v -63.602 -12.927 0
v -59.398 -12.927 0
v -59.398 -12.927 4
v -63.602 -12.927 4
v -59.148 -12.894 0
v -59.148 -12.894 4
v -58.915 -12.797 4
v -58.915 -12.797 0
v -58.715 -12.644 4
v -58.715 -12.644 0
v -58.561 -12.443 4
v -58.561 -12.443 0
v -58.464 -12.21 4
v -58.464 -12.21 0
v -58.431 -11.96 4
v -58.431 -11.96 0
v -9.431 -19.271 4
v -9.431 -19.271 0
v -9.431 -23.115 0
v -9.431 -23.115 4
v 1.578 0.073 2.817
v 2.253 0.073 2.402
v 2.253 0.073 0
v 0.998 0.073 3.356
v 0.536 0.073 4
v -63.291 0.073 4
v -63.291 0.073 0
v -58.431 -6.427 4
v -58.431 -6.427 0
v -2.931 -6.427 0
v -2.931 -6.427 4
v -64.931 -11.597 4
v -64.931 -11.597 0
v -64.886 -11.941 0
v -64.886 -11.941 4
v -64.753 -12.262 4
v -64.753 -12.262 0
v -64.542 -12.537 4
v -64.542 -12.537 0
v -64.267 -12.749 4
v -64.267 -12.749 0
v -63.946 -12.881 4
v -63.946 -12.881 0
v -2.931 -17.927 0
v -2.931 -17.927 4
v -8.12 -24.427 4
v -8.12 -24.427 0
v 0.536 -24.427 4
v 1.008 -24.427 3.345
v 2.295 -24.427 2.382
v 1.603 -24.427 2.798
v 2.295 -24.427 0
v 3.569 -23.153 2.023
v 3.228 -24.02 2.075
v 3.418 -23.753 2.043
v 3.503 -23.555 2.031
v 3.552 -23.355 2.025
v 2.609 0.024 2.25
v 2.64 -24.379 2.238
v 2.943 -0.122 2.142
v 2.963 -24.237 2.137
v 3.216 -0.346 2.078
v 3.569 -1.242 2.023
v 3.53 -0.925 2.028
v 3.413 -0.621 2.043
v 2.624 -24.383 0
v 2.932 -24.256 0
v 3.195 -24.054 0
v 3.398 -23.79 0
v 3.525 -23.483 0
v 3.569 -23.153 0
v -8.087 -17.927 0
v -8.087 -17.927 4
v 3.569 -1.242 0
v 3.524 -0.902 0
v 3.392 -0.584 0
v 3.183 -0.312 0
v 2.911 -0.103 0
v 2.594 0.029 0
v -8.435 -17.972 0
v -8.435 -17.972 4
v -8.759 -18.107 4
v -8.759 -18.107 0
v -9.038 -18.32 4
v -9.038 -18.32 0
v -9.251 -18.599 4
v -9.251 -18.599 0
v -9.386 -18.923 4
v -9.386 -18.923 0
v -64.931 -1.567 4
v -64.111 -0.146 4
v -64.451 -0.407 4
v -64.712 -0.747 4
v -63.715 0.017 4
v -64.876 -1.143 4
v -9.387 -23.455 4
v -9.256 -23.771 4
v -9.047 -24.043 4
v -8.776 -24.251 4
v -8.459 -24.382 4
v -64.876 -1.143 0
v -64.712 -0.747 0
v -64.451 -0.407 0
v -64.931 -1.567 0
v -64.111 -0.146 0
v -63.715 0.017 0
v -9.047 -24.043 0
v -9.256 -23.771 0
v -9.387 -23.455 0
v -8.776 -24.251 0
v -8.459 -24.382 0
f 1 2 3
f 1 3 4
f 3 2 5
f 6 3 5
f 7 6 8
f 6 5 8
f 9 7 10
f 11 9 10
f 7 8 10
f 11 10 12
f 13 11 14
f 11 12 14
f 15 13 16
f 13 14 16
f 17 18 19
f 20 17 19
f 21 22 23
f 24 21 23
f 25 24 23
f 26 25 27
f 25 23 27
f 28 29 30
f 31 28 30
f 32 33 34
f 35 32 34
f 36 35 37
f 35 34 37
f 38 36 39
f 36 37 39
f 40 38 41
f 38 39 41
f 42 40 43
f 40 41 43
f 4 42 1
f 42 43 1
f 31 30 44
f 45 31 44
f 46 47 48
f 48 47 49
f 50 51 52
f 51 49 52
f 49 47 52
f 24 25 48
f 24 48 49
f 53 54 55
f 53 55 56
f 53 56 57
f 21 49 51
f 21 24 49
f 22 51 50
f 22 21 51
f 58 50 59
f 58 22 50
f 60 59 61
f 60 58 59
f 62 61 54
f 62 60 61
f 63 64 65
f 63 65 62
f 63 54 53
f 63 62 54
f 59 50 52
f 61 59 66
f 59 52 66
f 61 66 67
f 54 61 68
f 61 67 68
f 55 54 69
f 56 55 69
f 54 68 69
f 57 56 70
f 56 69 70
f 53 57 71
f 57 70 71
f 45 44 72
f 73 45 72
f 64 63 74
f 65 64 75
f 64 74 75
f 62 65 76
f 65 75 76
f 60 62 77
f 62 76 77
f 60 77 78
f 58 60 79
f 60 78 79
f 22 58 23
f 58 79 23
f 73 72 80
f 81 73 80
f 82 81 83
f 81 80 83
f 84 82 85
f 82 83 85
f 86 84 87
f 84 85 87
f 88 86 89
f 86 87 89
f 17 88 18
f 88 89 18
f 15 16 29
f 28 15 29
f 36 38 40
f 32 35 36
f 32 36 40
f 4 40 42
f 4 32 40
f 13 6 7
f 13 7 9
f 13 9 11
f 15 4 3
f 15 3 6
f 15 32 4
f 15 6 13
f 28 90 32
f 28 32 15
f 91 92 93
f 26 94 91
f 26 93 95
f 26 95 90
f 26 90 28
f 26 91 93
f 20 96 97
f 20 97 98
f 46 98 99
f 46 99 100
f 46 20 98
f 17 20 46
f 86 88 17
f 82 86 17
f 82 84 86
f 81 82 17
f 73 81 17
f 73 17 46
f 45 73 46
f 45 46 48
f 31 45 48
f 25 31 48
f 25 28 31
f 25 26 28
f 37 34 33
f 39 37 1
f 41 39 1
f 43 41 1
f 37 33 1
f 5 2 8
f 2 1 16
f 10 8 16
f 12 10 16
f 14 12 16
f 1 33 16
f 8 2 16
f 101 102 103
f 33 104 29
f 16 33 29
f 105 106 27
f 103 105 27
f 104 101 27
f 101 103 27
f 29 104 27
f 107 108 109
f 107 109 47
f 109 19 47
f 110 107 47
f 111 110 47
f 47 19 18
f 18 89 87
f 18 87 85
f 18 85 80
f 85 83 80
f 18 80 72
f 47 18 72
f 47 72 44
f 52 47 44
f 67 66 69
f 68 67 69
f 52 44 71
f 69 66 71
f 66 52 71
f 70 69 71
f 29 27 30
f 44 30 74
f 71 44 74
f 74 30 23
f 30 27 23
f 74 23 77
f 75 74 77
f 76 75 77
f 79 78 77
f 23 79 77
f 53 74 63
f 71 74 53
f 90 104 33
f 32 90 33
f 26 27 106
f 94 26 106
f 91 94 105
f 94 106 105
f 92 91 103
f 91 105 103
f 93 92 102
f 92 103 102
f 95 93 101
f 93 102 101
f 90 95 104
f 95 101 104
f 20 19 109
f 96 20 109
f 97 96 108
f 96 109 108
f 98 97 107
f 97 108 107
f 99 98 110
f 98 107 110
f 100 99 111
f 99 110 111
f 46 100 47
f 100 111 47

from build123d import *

# Parameters (mm, degrees)
CYLINDER005_R          = 4
CYLINDER005_DEPTH      = 26
CYLINDER005_ROLL_ANGLE = 90
PAD006_DEPTH           = 4


with BuildPart() as cylinder005:
    # Cylinder005 → Cylinder005 (new body)
    with BuildSketch(Plane.XY):
        Circle(CYLINDER005_R)
    extrude(amount=CYLINDER005_DEPTH)


with BuildPart() as cylinder005_1:
    # Cylinder005 roll: moved
    add(cylinder005.part.rotate(Axis((0, 0, 0), (1, 0, 0)), CYLINDER005_ROLL_ANGLE))


with BuildPart() as cylinder005_2:
    # Cylinder005 placement: moved
    add(cylinder005_1.part.moved(Location((4, 1, 6))))


with BuildPart() as basebracket_beveled:
    # Sketch006 → Pad006 (new body)
    with BuildSketch(Plane.XY):
        with BuildLine():
            Line((2.253034, 0.073344), (-63.290852, 0.073344))
            ThreePointArc((-63.290852, 0.073344), (-64.45095, -0.407184), (-64.931478, -1.567282))
            Line((-64.931478, -1.567282), (-64.931478, -11.596925))
            ThreePointArc((-64.931478, -11.596925), (-64.542009, -12.537187), (-63.601747, -12.926656))
            Line((-59.397792, -12.926656), (-63.601747, -12.926656))
            ThreePointArc((-59.397792, -12.926656), (-58.714505, -12.643629), (-58.431478, -11.960342))
            Line((-58.431478, -11.960342), (-58.431478, -6.426656))
            Line((-58.431478, -6.426656), (-2.931478, -6.426656))
            Line((-2.931478, -6.426656), (-2.931478, -17.926656))
            Line((-2.931478, -17.926656), (-8.087364, -17.926656))
            ThreePointArc((-8.087364, -17.926656), (-9.037796, -18.320338), (-9.431478, -19.27077))
            Line((-9.431478, -19.27077), (-9.431478, -23.11525))
            ThreePointArc((-9.431478, -23.11525), (-9.047376, -24.042554), (-8.120072, -24.426656))
            Line((-8.120072, -24.426656), (2.294733, -24.426656))
            ThreePointArc((2.294733, -24.426656), (3.195438, -24.053572), (3.568522, -23.152867))
            Line((3.568522, -1.242144), (3.568522, -23.152867))
            ThreePointArc((3.568522, -1.242144), (3.183225, -0.311953), (2.253034, 0.073344))
        make_face()
    extrude(amount=PAD006_DEPTH)

    # Cut001005: cut Cylinder005
    add(cylinder005_2.part, mode=Mode.SUBTRACT)


solid = basebracket_beveled.part
